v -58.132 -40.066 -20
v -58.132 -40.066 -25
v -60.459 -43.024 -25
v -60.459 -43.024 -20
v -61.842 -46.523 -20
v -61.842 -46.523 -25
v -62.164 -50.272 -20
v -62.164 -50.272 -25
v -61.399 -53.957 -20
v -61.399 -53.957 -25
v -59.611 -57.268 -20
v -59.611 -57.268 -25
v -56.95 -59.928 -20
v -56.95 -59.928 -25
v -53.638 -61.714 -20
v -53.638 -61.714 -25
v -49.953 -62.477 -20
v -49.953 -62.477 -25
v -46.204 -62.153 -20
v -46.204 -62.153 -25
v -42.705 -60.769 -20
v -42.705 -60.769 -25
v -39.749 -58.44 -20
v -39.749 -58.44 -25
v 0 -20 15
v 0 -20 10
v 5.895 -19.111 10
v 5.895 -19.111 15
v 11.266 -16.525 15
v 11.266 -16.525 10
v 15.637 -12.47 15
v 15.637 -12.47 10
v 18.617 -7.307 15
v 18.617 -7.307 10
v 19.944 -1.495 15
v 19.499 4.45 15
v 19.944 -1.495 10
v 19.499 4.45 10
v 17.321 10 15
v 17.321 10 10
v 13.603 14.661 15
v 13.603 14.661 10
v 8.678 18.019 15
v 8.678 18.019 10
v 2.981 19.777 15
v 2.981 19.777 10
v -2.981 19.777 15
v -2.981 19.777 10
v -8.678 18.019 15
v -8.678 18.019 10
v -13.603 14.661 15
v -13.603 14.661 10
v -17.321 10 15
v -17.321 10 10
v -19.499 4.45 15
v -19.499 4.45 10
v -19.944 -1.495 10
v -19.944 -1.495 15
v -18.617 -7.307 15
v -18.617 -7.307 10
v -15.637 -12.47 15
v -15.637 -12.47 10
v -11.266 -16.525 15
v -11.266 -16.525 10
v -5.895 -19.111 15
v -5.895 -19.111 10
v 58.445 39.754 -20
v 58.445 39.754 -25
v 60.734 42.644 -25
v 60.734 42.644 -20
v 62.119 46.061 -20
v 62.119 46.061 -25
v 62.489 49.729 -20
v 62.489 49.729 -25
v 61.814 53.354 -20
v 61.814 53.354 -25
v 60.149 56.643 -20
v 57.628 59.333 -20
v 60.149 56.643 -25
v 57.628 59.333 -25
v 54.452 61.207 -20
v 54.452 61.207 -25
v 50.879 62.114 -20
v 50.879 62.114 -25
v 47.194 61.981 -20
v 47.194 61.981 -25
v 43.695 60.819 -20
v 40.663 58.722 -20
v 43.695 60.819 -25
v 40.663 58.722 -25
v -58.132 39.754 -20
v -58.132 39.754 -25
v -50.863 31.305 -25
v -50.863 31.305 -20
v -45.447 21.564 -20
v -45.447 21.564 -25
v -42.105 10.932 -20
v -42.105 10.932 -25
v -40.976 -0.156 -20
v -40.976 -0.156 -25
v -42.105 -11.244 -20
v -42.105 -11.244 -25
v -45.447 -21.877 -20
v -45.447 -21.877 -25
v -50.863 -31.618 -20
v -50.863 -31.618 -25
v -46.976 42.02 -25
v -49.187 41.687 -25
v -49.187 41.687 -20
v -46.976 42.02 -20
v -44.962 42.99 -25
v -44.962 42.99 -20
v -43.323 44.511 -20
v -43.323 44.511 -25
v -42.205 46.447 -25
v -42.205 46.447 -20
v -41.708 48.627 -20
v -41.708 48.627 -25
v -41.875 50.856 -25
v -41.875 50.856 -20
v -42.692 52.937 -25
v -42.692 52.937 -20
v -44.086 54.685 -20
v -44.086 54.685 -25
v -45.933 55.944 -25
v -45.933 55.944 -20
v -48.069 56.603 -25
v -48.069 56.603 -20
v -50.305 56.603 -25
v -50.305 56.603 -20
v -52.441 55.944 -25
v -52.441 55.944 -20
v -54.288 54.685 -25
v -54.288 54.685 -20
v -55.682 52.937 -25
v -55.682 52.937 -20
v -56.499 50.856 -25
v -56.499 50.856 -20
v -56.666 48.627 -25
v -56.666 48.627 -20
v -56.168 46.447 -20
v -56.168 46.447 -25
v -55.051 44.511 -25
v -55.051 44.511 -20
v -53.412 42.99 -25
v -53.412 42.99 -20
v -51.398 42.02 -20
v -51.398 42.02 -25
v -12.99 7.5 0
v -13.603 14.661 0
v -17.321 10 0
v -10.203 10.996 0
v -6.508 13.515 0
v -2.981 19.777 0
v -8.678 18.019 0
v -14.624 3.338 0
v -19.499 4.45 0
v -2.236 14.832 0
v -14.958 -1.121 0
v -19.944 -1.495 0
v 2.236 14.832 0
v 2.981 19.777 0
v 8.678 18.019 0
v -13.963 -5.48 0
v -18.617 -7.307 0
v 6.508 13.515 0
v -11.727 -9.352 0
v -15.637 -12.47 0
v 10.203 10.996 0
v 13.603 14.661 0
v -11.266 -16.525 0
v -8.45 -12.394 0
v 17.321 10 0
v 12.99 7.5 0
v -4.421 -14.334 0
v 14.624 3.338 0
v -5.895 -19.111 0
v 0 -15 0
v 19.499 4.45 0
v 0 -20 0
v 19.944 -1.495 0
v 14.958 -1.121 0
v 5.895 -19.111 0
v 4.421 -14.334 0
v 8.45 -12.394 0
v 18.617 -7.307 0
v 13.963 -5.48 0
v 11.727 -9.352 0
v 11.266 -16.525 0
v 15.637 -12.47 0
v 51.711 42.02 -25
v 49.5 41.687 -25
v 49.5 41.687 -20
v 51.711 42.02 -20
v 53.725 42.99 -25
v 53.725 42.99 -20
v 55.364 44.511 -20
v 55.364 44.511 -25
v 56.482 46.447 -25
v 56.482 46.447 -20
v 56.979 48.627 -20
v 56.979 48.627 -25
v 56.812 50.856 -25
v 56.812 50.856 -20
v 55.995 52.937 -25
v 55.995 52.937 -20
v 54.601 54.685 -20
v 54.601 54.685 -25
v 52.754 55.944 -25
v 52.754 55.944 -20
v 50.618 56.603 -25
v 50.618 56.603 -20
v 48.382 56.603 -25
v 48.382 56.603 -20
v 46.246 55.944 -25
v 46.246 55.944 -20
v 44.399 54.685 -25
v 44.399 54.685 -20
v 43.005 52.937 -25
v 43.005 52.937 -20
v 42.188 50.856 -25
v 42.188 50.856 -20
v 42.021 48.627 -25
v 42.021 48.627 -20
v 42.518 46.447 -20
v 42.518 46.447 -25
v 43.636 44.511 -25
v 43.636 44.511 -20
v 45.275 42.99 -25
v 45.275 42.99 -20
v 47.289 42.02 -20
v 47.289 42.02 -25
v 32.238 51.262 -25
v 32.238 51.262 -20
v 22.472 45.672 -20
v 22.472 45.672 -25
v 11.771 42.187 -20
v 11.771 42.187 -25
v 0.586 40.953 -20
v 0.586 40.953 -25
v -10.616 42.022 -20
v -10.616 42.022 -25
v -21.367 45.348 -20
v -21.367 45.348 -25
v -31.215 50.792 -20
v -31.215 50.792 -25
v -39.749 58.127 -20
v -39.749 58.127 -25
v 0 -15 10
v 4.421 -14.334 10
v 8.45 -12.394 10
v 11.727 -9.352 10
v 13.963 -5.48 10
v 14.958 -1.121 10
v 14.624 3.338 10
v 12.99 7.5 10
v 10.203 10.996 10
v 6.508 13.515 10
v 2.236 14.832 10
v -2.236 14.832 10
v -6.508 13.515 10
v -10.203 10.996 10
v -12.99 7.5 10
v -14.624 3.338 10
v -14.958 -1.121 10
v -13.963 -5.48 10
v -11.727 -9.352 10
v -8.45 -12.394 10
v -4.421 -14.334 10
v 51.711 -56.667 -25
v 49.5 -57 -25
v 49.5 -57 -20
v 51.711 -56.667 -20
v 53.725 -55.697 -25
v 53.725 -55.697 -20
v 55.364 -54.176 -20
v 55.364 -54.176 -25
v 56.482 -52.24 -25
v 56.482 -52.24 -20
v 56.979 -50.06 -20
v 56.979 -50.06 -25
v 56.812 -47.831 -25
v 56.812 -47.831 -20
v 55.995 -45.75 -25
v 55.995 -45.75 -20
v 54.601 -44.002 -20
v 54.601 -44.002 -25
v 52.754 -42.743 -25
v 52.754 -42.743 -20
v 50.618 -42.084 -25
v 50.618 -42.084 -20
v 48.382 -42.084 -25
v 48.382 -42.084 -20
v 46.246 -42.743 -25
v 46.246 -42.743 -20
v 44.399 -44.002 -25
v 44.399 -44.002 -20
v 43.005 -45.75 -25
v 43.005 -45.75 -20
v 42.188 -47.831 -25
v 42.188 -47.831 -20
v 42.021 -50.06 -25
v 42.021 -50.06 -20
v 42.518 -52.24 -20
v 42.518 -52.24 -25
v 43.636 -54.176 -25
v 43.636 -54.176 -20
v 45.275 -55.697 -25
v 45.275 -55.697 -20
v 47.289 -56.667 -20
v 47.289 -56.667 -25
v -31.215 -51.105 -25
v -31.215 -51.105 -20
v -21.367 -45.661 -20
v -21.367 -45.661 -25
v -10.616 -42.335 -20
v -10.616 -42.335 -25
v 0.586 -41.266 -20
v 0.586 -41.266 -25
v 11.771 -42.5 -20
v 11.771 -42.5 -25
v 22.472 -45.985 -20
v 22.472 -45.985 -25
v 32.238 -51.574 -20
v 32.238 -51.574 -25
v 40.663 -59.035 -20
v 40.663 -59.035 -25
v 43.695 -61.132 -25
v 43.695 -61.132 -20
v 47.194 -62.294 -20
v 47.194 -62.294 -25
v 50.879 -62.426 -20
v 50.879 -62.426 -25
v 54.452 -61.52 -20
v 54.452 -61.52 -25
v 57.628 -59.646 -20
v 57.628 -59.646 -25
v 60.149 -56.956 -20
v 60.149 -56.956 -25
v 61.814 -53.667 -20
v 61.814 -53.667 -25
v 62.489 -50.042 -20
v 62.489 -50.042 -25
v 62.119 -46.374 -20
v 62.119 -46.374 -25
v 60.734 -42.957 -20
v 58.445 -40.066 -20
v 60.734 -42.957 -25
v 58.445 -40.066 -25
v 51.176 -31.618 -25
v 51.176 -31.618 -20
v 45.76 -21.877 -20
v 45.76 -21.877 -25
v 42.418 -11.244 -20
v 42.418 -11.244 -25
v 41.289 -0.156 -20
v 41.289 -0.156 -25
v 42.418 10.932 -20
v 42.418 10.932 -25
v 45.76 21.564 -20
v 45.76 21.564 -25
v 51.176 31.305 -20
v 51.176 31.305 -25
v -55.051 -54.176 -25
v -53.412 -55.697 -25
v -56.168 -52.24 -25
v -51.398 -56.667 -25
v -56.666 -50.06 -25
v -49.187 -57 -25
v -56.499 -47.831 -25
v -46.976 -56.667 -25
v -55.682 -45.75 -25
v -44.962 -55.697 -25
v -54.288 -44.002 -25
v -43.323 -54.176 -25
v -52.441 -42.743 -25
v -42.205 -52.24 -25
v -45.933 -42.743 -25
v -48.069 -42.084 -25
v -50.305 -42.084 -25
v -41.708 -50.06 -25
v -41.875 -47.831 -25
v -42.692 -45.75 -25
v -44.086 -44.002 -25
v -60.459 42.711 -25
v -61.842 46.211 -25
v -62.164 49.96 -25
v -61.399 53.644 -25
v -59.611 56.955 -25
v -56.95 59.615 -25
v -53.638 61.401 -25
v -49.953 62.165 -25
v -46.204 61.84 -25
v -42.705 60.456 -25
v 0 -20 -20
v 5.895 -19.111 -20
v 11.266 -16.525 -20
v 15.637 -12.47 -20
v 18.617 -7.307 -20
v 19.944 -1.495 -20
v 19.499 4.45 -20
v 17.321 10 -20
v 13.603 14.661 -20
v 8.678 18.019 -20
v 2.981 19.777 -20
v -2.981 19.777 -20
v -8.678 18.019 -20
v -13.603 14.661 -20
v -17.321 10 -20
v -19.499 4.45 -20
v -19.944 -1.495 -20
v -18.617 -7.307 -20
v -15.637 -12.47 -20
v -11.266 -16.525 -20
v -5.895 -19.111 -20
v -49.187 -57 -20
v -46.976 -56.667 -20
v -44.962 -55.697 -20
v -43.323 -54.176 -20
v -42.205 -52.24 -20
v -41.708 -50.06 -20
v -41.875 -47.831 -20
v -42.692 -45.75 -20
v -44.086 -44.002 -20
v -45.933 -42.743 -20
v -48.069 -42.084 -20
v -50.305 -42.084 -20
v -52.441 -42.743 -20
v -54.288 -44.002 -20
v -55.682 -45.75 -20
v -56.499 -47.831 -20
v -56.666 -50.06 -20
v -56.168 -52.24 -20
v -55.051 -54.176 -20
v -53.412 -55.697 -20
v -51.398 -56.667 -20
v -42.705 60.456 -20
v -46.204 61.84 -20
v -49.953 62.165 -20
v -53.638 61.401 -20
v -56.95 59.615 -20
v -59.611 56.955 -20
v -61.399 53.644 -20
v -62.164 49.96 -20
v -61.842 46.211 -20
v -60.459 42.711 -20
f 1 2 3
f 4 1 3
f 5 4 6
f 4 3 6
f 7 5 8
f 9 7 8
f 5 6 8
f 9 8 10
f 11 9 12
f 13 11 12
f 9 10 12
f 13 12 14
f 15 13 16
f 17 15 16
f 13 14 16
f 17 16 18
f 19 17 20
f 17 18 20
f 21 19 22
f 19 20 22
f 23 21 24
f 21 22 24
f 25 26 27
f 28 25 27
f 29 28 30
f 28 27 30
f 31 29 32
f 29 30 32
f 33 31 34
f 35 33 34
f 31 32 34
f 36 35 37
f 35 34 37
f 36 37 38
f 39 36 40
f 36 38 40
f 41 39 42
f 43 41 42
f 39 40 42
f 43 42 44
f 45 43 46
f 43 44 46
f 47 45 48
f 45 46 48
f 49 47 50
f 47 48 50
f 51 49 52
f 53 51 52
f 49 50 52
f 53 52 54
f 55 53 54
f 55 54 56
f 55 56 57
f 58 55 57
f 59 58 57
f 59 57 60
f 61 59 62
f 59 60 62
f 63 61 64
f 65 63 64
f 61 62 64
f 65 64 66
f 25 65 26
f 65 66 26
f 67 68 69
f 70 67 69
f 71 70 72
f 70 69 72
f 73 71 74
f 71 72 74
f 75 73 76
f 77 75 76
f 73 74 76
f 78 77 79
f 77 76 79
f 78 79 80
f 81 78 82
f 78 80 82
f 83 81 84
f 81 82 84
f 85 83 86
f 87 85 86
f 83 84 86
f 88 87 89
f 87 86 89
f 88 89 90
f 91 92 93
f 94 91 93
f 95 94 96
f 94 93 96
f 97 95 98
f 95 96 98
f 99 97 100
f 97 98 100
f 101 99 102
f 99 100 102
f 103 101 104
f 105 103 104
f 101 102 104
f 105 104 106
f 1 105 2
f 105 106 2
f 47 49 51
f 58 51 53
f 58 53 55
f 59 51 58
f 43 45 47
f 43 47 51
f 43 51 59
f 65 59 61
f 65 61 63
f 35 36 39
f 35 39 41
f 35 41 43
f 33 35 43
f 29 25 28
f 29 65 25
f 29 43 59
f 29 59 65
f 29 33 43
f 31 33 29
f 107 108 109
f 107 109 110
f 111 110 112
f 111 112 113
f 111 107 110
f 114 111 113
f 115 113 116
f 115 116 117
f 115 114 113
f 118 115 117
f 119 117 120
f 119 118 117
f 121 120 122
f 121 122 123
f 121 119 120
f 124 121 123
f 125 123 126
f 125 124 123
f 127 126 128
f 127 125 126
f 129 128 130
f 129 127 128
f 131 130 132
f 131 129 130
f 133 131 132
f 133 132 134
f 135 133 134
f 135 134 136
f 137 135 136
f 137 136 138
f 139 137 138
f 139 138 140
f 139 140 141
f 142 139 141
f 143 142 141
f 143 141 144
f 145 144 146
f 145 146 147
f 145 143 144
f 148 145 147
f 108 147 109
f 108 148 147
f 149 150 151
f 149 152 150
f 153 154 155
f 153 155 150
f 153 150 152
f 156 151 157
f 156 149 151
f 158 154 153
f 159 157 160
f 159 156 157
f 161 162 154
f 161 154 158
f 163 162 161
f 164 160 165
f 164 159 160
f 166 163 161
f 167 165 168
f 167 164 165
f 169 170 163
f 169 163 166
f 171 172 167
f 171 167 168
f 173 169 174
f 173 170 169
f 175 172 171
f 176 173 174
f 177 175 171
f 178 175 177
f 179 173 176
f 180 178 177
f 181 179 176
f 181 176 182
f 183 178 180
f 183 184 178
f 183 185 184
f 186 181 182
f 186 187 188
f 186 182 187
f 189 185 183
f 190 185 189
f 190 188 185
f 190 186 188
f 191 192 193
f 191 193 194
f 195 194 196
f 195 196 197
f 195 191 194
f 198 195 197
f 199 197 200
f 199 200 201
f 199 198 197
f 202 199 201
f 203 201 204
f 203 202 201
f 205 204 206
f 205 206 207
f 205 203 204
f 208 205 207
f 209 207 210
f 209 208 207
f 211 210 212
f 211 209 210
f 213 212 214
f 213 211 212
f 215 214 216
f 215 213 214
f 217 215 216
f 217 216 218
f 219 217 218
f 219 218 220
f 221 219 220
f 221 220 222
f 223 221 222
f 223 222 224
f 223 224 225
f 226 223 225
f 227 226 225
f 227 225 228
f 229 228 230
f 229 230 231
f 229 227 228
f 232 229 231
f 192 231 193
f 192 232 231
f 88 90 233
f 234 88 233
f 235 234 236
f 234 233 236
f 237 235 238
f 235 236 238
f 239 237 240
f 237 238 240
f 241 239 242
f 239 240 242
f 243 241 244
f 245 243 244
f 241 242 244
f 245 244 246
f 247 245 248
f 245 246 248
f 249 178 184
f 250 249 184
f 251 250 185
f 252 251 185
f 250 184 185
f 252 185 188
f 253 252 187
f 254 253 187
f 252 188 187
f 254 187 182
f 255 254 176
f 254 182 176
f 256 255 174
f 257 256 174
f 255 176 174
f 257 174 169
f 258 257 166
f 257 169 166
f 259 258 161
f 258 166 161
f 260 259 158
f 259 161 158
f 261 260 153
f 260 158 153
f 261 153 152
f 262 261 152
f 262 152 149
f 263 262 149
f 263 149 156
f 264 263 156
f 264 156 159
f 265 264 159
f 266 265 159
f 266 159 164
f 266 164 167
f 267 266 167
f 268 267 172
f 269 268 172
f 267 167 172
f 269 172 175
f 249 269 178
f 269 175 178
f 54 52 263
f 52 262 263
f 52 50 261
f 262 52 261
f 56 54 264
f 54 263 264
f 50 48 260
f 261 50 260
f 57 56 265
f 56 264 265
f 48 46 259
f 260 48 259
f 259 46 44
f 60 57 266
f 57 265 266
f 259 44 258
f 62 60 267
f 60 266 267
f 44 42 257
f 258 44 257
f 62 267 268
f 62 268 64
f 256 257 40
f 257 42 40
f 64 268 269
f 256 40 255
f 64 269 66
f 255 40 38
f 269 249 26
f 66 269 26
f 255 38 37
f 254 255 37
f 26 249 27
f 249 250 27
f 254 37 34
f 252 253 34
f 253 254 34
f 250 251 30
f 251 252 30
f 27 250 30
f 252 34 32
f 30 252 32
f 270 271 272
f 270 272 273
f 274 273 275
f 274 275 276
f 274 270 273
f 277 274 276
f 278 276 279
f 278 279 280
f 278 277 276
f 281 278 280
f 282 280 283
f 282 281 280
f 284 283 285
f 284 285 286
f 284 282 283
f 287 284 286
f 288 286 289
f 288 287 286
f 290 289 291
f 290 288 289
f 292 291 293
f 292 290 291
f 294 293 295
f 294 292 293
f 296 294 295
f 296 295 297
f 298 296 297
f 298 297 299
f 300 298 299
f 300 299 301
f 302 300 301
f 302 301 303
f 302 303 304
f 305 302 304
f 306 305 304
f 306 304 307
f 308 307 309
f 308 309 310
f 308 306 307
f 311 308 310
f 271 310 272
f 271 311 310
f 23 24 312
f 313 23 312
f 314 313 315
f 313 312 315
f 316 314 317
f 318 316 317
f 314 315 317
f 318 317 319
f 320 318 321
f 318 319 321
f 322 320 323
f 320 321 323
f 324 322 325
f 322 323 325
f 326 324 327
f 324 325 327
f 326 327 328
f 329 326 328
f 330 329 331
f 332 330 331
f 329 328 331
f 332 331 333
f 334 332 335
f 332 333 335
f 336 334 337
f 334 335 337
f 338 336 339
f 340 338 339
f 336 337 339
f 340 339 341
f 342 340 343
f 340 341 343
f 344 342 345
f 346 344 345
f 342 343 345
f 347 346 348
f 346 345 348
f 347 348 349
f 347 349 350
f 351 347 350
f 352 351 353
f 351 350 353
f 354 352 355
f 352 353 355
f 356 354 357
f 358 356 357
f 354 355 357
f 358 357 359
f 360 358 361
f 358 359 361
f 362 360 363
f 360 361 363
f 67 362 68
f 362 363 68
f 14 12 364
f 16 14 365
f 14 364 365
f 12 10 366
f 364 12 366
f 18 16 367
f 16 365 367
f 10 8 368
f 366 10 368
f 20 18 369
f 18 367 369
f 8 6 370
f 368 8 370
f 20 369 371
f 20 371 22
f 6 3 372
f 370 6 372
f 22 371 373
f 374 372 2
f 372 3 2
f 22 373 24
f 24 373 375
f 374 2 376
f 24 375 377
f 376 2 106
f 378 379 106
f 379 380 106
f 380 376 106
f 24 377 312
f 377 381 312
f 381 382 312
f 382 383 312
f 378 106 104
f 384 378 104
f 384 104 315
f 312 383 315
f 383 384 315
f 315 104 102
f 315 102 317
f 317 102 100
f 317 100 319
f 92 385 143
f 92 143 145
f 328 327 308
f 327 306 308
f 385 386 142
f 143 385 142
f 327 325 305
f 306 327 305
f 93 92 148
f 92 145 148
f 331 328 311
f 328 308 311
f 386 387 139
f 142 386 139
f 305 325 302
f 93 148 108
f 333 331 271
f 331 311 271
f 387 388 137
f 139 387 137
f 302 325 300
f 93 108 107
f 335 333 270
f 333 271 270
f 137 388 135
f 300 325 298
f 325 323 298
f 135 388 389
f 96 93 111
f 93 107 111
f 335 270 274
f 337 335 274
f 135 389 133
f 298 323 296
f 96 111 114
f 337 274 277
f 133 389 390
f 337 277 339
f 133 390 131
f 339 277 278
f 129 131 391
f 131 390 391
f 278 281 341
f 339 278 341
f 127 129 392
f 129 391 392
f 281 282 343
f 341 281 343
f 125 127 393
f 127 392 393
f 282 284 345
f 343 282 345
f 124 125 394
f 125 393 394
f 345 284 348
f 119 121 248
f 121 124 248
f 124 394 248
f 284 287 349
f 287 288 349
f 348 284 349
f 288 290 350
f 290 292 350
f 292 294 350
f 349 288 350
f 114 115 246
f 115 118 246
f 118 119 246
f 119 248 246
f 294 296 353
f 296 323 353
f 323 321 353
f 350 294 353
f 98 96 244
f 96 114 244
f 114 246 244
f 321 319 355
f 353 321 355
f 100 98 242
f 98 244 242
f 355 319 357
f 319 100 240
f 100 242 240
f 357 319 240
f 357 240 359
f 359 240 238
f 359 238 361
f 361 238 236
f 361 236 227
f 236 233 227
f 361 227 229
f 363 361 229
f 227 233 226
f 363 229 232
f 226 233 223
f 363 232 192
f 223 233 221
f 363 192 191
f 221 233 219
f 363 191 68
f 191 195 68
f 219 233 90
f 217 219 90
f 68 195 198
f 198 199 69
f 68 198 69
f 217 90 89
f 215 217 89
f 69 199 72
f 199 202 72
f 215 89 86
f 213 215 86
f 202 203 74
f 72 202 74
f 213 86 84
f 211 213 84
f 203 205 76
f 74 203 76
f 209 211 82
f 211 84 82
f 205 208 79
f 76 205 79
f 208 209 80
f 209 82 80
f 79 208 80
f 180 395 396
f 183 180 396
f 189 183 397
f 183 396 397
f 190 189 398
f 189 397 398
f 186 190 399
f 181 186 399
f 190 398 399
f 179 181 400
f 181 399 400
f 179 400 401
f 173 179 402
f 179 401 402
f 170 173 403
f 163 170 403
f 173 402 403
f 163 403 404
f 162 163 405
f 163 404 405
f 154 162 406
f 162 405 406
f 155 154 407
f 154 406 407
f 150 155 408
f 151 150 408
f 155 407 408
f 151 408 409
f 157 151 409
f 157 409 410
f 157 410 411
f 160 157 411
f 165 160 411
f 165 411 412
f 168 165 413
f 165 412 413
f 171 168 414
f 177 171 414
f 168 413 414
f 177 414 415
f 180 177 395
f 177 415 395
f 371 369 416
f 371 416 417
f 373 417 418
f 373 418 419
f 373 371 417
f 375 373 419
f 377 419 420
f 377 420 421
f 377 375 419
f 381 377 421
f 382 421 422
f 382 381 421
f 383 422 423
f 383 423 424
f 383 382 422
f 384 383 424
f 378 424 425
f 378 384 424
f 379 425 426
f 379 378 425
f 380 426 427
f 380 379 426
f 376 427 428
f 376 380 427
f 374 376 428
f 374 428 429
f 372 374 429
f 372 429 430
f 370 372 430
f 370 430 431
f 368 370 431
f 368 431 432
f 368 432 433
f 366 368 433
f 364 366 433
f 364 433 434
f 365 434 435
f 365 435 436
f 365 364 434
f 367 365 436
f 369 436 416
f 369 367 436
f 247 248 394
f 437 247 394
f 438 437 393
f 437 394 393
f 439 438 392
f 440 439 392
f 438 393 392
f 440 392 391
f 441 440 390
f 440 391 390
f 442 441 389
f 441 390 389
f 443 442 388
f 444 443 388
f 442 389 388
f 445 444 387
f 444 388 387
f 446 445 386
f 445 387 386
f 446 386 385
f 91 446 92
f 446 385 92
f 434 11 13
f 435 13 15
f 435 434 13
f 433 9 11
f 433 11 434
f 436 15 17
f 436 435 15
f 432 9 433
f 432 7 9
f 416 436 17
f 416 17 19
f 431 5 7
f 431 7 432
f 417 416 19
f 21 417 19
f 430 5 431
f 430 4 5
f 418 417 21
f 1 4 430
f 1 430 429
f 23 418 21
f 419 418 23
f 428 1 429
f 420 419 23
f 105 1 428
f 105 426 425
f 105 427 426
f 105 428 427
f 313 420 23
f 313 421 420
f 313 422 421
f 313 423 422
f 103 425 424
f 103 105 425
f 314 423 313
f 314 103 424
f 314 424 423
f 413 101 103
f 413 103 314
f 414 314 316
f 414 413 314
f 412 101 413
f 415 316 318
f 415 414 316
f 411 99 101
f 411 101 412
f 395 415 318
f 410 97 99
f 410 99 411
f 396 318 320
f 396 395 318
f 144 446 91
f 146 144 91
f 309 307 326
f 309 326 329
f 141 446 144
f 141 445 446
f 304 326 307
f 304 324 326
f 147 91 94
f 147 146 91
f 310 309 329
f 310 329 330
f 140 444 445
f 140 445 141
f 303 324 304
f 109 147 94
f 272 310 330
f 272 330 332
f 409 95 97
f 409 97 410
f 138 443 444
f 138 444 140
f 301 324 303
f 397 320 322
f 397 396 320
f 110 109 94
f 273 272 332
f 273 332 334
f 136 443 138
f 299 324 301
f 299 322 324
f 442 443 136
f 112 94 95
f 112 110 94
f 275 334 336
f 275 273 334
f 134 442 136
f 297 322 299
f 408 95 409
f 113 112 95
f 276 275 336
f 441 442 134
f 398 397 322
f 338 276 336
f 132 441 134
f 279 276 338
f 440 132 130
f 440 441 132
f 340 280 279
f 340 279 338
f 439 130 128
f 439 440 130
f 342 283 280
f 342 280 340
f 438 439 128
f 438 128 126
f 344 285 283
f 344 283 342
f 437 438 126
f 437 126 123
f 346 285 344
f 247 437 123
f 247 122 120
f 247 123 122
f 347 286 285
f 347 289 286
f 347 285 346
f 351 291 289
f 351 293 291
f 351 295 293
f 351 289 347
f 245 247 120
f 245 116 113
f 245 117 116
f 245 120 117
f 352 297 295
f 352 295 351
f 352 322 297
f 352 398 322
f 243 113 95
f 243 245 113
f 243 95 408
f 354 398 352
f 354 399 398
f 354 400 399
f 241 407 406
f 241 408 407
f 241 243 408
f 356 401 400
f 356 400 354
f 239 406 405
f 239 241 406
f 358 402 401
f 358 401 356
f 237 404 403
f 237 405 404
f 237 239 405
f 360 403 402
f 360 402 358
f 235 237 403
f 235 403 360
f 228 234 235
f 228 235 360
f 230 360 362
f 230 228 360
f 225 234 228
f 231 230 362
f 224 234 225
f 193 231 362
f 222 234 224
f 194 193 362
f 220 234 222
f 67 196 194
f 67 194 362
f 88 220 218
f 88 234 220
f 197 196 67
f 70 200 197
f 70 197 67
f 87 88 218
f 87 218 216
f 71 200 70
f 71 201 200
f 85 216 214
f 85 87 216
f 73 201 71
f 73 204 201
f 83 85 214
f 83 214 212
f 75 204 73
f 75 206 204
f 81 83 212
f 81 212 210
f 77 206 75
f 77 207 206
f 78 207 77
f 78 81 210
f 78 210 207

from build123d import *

# Parameters (mm, degrees)
SKETCH1_R             = 7.5
BOSS_EXTRUDE1_DEPTH   = 5
SKETCH3_R             = 20
BOSS_EXTRUDE2_DEPTH   = 20
SKETCH4_R             = 15
BOSS_EXTRUDE3_DEPTH   = 10
SKETCH5_R             = 20
BOSS_EXTRUDE4_DEPTH   = 5
BODY_MOVE_COPY1_ANGLE = 90


with BuildPart() as part:
    # Sketch1 → Boss-Extrude1 (new body)
    with BuildSketch(Plane(origin=(0, 0, 0), x_dir=(1, 0, 0), z_dir=(0, 1, 0))):
        with BuildLine():
            ThreePointArc((-39.749220484, 58.127463165), (-58.377062168, 58.381791069), (-58.131919931, 39.753826237))
            ThreePointArc((-58.131919931, 39.753826237), (-40.976062677, -0.15633362), (-58.131919931, -40.066493476))
            ThreePointArc((-58.131919931, -40.066493476), (-58.377062168, -58.694458308), (-39.749220484, -58.440130404))
            ThreePointArc((-39.749220484, -58.440130404), (0.58615995, -41.266091018), (40.663235765, -59.034561344))
            ThreePointArc((40.663235765, -59.034561344), (58.984188278, -58.390820393), (58.444979195, -40.066493476))
            ThreePointArc((58.444979195, -40.066493476), (41.289121941, -0.15633362), (58.444979195, 39.753826237))
            ThreePointArc((58.444979195, 39.753826237), (58.984188278, 58.078153154), (40.663235765, 58.721894105))
            ThreePointArc((40.663235765, 58.721894105), (0.58615995, 40.953423779), (-39.749220484, 58.127463165))
        make_face()
        with Locations(Location((-49.186940736, 49.187136748, 0), (0, 0, 270))):
            Circle(SKETCH1_R, mode=Mode.SUBTRACT)
        with Locations(Location((49.5, 49.187136748, 0), (0, 0, 270))):
            Circle(SKETCH1_R, mode=Mode.SUBTRACT)
        with Locations(Location((-49.186940736, -49.499803987, 0), (0, 0, 270))):
            Circle(SKETCH1_R, mode=Mode.SUBTRACT)
        with Locations(Location((49.5, -49.499803987, 0), (0, 0, 270))):
            Circle(SKETCH1_R, mode=Mode.SUBTRACT)
    extrude(amount=BOSS_EXTRUDE1_DEPTH)

    # Sketch3 → Boss-Extrude2 (add)
    with BuildSketch(Plane(origin=(0, 5, 0), x_dir=(1, 0, 0), z_dir=(0, 1, 0))):
        with Locations(Location((0, 0, 0), (0, 0, 270))):
            Circle(SKETCH3_R)
    extrude(amount=BOSS_EXTRUDE2_DEPTH)

    # Sketch4 → Boss-Extrude3 (add)
    with BuildSketch(Plane(origin=(0, 25, 0), x_dir=(1, 0, 0), z_dir=(0, 1, 0))):
        with Locations(Location((0, 0, 0), (0, 0, 270))):
            Circle(SKETCH4_R)
    extrude(amount=BOSS_EXTRUDE3_DEPTH)

    # Sketch5 → Boss-Extrude4 (add)
    with BuildSketch(Plane(origin=(0, 35, 0), x_dir=(1, 0, 0), z_dir=(0, 1, 0))):
        with Locations(Location((0, 0, 0), (0, 0, 270))):
            Circle(SKETCH5_R)
    extrude(amount=BOSS_EXTRUDE4_DEPTH)


with BuildPart() as part_1:
    # Body-Move/Copy1: read off the stored shape, not the designer's step
    # Body-Move/Copy1: moved
    add(part.part.moved(Location((0, -25, 0))).rotate(Axis((0, 0, 0), (1, 0, 0)), BODY_MOVE_COPY1_ANGLE))


solid = part_1.part
